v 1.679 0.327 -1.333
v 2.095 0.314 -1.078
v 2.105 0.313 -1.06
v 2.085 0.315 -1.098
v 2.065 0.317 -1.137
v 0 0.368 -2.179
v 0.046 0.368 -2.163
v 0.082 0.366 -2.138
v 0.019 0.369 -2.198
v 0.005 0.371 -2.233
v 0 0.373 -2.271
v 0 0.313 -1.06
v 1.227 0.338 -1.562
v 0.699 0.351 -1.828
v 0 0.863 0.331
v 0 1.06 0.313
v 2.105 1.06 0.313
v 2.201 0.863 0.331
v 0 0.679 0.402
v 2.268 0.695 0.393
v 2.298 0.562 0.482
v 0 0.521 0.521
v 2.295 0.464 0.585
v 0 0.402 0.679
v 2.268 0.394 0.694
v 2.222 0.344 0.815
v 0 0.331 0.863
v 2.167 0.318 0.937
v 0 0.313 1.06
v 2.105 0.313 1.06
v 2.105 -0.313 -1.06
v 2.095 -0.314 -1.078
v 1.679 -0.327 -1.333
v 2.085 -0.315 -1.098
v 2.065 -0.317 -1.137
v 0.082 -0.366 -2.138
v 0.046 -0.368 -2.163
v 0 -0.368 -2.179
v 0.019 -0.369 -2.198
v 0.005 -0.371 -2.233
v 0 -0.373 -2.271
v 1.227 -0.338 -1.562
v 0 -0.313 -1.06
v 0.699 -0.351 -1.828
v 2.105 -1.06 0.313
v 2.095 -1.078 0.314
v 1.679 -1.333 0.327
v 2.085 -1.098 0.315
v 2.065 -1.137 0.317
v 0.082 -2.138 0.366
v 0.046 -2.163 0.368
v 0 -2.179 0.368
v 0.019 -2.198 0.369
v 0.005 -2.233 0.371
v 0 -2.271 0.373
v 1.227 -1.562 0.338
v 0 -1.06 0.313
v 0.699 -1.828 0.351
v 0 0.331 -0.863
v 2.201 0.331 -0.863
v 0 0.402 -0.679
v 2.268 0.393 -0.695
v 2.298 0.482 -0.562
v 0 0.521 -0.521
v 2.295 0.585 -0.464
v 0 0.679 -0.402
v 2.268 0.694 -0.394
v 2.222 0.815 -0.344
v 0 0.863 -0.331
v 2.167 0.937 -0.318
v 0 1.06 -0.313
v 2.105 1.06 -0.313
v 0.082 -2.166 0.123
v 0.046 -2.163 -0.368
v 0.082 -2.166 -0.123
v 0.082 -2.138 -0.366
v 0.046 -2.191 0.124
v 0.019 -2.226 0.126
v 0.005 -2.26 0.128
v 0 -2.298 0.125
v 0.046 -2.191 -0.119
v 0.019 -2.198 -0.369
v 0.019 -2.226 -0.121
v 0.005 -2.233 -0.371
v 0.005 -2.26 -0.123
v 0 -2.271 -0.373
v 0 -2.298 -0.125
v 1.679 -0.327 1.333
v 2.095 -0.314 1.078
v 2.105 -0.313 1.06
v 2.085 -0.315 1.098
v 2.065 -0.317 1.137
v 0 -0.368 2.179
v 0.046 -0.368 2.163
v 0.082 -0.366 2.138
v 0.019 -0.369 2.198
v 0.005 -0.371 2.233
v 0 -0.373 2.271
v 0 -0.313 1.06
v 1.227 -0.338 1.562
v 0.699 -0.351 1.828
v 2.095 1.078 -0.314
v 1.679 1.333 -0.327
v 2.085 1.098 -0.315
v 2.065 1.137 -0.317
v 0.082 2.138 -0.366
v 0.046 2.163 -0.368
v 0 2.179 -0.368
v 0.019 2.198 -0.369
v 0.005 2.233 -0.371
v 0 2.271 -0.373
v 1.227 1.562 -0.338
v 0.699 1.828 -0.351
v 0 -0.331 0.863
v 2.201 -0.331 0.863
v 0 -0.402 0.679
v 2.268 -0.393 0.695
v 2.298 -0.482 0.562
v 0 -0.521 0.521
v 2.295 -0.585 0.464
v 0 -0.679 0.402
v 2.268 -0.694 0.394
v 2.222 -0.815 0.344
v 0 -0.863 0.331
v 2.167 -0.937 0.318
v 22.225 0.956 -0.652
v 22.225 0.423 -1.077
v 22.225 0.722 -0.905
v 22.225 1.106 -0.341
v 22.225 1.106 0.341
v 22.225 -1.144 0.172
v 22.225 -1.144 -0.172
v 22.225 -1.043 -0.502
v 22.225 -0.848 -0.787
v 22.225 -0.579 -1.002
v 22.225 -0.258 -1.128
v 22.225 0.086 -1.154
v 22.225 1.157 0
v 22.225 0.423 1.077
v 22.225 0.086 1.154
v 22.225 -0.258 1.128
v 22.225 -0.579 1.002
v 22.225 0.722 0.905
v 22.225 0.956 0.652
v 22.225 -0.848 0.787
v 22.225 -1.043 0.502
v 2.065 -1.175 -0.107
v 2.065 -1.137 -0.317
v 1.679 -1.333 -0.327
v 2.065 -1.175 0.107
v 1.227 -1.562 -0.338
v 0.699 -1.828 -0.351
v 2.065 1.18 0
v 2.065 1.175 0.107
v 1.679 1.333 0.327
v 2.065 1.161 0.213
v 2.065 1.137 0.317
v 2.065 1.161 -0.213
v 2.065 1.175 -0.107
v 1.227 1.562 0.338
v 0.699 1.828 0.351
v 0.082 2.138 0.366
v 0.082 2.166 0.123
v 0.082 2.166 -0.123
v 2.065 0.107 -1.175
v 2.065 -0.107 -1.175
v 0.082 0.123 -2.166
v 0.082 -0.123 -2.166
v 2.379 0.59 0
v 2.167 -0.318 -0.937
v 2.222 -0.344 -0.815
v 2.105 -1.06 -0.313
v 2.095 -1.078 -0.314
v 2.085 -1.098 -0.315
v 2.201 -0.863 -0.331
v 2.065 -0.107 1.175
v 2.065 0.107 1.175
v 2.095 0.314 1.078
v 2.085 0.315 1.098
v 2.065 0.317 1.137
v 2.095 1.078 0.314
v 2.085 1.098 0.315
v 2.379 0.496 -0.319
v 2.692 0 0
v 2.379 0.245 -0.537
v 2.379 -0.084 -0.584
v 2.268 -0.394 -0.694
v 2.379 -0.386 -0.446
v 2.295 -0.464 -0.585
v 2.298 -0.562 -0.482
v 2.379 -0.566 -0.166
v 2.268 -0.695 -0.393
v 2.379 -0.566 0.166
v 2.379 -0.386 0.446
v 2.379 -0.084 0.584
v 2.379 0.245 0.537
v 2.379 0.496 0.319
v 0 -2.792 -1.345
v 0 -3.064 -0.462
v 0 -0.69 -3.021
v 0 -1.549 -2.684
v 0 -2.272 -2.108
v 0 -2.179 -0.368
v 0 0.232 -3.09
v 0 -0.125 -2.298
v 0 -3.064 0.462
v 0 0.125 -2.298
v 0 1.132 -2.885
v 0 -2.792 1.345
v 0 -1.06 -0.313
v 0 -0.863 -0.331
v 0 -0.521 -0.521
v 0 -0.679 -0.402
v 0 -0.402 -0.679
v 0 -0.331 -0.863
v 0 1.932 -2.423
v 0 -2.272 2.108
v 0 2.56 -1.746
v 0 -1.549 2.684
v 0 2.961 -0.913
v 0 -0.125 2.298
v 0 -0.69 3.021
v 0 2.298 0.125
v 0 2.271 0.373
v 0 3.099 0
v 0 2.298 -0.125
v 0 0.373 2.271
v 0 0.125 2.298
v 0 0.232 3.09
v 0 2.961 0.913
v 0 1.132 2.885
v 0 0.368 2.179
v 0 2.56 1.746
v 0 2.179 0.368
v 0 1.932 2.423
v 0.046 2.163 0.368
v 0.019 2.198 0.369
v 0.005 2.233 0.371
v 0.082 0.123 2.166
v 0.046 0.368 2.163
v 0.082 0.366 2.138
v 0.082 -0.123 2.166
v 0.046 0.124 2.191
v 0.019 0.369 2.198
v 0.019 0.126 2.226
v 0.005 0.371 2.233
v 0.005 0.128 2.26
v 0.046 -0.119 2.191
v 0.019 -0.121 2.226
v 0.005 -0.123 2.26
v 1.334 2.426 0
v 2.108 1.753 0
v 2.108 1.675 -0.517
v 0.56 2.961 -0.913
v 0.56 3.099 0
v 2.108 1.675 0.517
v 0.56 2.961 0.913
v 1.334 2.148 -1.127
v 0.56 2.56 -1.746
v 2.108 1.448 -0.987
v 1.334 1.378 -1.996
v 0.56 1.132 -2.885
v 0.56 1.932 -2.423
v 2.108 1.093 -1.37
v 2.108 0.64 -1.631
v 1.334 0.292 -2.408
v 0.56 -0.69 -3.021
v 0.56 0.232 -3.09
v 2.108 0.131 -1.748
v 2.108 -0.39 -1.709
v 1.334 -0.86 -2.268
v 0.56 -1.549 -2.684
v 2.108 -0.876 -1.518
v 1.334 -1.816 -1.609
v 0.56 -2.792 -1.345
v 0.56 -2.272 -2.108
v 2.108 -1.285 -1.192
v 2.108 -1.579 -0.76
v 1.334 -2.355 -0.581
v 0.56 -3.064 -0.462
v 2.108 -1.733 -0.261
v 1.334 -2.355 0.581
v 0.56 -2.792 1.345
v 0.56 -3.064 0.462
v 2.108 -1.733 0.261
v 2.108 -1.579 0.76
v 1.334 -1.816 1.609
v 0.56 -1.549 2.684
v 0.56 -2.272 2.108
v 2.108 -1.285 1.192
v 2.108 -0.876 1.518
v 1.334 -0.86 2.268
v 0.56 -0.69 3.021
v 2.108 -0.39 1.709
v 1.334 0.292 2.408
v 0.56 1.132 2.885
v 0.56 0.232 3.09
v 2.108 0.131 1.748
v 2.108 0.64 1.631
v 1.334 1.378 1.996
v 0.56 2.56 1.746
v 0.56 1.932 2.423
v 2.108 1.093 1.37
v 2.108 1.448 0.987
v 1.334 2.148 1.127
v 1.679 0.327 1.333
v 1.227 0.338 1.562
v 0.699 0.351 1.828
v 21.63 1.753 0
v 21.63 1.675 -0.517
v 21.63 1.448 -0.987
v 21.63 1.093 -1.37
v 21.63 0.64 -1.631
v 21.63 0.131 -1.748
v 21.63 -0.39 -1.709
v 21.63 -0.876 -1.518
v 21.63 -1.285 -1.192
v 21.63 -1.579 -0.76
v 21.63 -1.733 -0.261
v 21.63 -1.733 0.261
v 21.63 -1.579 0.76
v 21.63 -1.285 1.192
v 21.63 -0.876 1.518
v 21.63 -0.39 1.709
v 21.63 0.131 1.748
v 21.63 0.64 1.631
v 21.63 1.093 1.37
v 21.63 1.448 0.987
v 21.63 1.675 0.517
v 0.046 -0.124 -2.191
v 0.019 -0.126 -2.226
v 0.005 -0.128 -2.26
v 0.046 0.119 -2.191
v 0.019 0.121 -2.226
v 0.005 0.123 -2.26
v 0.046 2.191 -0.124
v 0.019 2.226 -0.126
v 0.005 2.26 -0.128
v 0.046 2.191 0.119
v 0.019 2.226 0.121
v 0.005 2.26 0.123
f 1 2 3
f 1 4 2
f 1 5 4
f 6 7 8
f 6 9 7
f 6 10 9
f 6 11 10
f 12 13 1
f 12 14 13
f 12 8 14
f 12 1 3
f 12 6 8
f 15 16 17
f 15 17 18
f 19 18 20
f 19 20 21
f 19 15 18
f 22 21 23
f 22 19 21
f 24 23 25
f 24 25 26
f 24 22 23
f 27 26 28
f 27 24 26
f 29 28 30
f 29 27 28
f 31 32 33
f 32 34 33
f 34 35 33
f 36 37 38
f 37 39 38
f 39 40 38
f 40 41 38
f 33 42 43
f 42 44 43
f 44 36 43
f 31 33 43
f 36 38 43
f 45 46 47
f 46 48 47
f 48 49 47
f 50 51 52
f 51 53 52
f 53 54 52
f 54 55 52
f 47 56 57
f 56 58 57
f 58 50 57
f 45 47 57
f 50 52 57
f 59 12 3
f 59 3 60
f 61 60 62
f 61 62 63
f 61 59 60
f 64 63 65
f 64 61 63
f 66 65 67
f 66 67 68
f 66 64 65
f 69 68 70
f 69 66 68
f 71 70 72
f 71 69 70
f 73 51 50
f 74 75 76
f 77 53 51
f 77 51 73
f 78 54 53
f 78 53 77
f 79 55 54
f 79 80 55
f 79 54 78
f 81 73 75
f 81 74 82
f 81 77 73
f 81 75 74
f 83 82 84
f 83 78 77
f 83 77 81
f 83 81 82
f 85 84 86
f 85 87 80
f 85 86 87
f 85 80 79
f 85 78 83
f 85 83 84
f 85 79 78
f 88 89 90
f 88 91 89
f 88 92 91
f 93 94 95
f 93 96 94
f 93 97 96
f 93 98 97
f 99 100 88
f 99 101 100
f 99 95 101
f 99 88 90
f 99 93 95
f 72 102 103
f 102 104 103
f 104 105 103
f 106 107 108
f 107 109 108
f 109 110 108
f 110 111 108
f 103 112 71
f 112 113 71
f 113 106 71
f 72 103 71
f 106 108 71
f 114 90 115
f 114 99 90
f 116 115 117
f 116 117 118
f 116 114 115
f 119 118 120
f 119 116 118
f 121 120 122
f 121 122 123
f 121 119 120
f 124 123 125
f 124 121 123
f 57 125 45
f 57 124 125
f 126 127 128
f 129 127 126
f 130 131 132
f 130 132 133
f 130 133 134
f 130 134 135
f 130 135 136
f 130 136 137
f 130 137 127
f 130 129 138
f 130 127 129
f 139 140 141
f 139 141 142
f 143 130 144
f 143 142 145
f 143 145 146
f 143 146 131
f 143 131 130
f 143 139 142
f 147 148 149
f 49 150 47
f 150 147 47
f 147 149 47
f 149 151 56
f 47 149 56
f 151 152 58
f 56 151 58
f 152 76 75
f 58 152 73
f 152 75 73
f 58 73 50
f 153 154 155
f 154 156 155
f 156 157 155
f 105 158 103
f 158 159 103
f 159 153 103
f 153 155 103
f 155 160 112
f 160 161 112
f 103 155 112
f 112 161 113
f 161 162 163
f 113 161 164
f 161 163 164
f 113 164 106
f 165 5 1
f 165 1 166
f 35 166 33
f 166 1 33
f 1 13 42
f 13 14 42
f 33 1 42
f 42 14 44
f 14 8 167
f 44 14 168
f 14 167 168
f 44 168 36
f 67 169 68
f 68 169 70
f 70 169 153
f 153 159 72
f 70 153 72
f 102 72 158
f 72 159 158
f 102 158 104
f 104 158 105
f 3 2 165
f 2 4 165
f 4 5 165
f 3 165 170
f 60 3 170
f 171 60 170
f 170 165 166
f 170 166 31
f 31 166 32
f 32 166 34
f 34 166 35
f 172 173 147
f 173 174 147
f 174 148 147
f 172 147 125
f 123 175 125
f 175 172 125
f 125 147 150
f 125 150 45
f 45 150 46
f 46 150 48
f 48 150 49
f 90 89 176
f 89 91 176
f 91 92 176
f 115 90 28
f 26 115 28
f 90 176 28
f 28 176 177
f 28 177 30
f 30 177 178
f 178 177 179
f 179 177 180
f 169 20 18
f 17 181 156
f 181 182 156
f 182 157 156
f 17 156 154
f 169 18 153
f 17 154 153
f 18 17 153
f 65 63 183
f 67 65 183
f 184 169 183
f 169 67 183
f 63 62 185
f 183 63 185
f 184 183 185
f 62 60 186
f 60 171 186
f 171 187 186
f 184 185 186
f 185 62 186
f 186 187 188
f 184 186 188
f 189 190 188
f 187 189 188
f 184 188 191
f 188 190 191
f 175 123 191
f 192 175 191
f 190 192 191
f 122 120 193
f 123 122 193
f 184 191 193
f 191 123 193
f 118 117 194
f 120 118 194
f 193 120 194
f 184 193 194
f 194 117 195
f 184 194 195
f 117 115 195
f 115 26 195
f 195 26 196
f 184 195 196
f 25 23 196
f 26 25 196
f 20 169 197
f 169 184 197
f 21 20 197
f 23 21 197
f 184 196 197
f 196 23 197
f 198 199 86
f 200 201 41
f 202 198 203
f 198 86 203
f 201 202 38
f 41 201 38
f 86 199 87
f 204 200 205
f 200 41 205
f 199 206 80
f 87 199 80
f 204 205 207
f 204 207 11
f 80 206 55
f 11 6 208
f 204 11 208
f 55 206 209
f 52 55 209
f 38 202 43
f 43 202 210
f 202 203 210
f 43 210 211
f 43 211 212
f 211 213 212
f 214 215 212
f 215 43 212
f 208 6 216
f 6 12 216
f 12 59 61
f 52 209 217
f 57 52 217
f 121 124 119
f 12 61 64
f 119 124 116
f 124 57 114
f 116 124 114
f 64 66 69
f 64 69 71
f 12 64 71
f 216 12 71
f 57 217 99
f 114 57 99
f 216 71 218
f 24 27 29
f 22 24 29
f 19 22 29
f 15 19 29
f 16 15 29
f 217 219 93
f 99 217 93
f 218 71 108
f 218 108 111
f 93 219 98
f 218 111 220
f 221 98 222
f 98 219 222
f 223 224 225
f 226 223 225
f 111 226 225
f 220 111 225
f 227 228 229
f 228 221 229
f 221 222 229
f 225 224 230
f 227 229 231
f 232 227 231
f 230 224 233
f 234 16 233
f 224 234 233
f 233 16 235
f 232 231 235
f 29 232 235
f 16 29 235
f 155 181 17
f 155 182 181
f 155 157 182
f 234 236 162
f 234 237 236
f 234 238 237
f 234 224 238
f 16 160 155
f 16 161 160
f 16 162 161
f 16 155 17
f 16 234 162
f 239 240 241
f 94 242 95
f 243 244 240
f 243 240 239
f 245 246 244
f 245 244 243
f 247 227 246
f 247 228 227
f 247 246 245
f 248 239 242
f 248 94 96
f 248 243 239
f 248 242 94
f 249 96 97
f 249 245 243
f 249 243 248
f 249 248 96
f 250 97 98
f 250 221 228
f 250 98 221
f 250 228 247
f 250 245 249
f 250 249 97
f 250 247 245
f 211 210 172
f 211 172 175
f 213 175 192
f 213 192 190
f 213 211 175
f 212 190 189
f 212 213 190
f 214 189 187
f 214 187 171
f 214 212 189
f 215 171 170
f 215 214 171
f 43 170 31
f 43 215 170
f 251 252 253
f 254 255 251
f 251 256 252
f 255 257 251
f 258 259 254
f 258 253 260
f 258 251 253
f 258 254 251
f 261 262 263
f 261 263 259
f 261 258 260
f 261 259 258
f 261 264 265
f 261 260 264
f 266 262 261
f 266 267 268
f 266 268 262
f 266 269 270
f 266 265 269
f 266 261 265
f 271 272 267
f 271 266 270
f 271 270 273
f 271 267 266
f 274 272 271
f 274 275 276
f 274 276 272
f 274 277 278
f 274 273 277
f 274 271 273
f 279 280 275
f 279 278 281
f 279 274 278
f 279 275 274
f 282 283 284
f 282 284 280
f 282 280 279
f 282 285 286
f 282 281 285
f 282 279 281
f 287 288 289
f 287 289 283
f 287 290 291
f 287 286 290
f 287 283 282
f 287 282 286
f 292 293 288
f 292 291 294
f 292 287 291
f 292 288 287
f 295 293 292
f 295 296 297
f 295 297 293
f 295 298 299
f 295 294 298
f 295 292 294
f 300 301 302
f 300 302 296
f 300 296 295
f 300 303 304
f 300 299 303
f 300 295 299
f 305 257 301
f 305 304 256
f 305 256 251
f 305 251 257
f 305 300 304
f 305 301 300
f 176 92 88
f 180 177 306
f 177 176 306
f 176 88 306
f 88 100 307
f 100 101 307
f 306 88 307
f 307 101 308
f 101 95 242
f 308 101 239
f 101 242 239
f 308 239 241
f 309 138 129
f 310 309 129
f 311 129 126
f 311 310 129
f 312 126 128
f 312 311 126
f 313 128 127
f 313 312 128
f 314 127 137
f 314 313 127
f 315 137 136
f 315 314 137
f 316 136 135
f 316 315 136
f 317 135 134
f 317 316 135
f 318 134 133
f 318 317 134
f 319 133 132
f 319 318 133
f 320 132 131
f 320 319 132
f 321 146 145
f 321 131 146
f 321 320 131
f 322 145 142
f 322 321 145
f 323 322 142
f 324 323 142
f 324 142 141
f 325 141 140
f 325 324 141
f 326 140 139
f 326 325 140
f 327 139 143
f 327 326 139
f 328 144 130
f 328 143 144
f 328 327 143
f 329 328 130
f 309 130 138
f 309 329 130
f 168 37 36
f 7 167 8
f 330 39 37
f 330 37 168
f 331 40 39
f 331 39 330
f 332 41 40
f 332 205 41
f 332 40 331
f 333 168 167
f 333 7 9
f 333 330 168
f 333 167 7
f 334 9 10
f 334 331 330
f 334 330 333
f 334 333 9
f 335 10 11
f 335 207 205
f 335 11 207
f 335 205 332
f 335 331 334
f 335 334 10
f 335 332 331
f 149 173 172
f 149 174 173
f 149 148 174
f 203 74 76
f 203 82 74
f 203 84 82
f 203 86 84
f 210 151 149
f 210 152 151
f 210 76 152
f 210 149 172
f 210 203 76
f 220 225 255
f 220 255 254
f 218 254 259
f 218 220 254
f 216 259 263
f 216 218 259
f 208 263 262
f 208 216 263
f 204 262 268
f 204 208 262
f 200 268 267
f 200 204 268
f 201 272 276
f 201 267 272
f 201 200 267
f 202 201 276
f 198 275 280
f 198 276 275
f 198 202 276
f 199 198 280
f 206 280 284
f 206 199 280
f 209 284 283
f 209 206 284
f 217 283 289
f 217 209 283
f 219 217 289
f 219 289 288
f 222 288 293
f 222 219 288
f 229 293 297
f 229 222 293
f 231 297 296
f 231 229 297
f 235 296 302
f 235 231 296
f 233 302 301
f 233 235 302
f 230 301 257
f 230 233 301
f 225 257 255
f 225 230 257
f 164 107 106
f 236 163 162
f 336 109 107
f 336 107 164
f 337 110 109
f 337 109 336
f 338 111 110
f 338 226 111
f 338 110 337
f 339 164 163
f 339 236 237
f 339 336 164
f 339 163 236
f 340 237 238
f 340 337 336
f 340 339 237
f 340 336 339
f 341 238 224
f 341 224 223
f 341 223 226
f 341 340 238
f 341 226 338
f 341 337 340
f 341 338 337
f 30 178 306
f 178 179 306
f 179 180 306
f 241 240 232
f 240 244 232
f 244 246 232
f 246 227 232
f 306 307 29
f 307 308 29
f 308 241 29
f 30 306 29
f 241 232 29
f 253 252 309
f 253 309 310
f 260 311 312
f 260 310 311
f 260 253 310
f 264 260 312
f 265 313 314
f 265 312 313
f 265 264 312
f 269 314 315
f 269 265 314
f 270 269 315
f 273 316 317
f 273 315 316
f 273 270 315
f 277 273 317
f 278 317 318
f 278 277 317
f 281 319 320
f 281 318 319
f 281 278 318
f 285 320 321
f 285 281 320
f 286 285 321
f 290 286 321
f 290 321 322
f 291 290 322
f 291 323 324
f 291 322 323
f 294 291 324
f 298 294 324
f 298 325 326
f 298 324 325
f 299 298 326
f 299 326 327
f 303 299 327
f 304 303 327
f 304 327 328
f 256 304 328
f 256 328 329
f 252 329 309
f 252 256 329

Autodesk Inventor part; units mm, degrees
ref_plane "YZ Plane" through (0, 0, 0) normal (1, 0, 0) x (0, 1, 0)
ref_plane "XZ Plane" through (0, 0, 0) normal (0, 1, 0) x (-1, 0, 0)
sketch "Sketch1" plane through (0, 0, 0) normal (0, 0, 1) x (1, 0, 0)
  line L0 (2.6924, 0) -> (22.225, 0)
  line L1 (22.225, 0) -> (22.225, 1.7526)
  line L2 (22.225, 1.7526) -> (2.1082, 1.7526)
  line L3 (0.5596, 3.0988) -> (0, 3.0988)
  line L4 (-4.445, 0) -> (26.67, 0) projected
  line L5 (0, -0.6198) -> (0, 3.7186) projected
  line L6 (0, 2.2098) -> (2.0648, 1.1803)
  line L7 (2.0648, 1.1803) -> (2.6924, 0)
  line L8 (2.1082, 1.7526) -> (0.5596, 3.0988)
  line L9 (0, 3.0988) -> (0, 2.2098)
  dimension "d2" = 3.5052
  dimension "d3" = 6.1976
  dimension "d4" = 2.6924
  dimension "d5" = 4.4196
  dimension "d6" = 26.5
  dimension "d7" = 62
  dimension "d13" = 41
  dimension "d14" = 2.1082
  dimension "d15" = 22.225
revolve "Body" add sketch "Sketch1" angle 360 about axis through (2.6924, 0, 0) along (1, 0, 0) contours L7 L6 L5 L3 L8 L2 L1 L0
sketch "Sketch2" plane through (0, 0, 0) normal (-1, 0, 0) x (0, 0, 1)
  line L0 (0, -4.3383) -> (0, 4.3383) projected
  line L1 (-4.3383, 0) -> (4.3383, 0) projected
  line L2 (0, 2.2098) -> (0, 0) construction
  line L3 (0, 0) -> (2.2098, 0) construction
  arc A0 (0.7366, 0) -> (0, 0.7366) centre (0, 0) ccw
  line L4 (0, 0) -> (0.7947, 0.7947) construction
  arc A1 (1.1049, 0) -> (0, 1.1049) centre (0, 0) ccw construction
  line L5 (0.3683, 2.1789) -> (0.3131, 1.0596)
  line L6 (2.1789, 0.3683) -> (1.0596, 0.3131)
  arc A2 (0.3131, 1.0596) -> (1.0596, 0.3131) centre (1.0245, 1.0245) ccw
  arc A3 (2.2098, 0) -> (2.1789, 0.3683) centre (0, 0) ccw
  arc A4 (0.3683, 2.1789) -> (0, 2.2098) centre (0, 0) ccw
  arc A5 (2.1789, 0.3683) -> (0.3683, 2.1789) centre (0, 0) ccw
  line L7 (0.3683, -2.1789) -> (0.3131, -1.0596)
  line L8 (2.1789, -0.3683) -> (1.0596, -0.3131)
  arc A6 (1.0596, -0.3131) -> (0.3131, -1.0596) centre (1.0245, -1.0245) ccw
  arc A7 (2.1789, -0.3683) -> (2.2098, 0) centre (0, 0) ccw
  arc A8 (0, -2.2098) -> (0.3683, -2.1789) centre (0, 0) ccw
  arc A9 (0.3683, -2.1789) -> (2.1789, -0.3683) centre (0, 0) ccw
  line L9 (-0.3683, 2.1789) -> (-0.3131, 1.0596)
  line L10 (-2.1789, 0.3683) -> (-1.0596, 0.3131)
  arc A10 (-1.0596, 0.3131) -> (-0.3131, 1.0596) centre (-1.0245, 1.0245) ccw
  arc A11 (-2.1789, 0.3683) -> (-2.2098, 0) centre (0, 0) ccw
  arc A12 (0, 2.2098) -> (-0.3683, 2.1789) centre (0, 0) ccw
  arc A13 (-0.3683, 2.1789) -> (-2.1789, 0.3683) centre (0, 0) ccw
  arc A14 (-2.1789, -0.3683) -> (-0.3683, -2.1789) centre (0, 0) ccw
  arc A15 (-0.3683, -2.1789) -> (0, -2.2098) centre (0, 0) ccw
  arc A16 (-2.2098, 0) -> (-2.1789, -0.3683) centre (0, 0) ccw
  line L11 (-2.1789, -0.3683) -> (-1.0596, -0.3131)
  arc A17 (-0.3131, -1.0596) -> (-1.0596, -0.3131) centre (-1.0245, -1.0245) ccw
  line L12 (-0.3683, -2.1789) -> (-0.3131, -1.0596)
  dimension "d18" = 45
  dimension "d19" = 1.4732
  dimension "d20" = 2.2098
  dimension "d21" = 4.4196
  dimension "d22" = 0.3683
extrude "Slot" add sketch "Sketch2" against normal up to next contours A2 L5 A5 L6 | L9 A10 L10 A13 | L7 A6 L8 A9 | A14 L11 A17 L12
fillet "Fillet1" radius 0.1473 4 edges at (0, 2.2098, 0) (0, 0, 2.2098) (0, -2.2098, 0) (0, 0, -2.2098)
thread "Thread" size "6-32 UNC" class "2A" standard "ANSI Unified Screw Threads" length 18.1324
chamfer "Chamfer1" distance 0.5953 distance2 0.5953 1 edges at (22.225, -1.7526, 0) measured on face at (22.225, -0.5173, -0.2715)
ref_plane "Work Plane2" through (2.032, 0, 0) normal (0, 1, 0) x (1, 0, 0)
equation "\"d2\" = GD"
equation "\"d3\" = KOD"
equation "\"d4\" = INTI"
equation "\"d5\" = SDM"
equation "\"d13\" = 0.5 * SEWI"
equation "\"d14\" = KOH"
equation "\"d15\" = NLG"
equation "\"d19\" = 0.333333 * SDM"
equation "\"d20\" = 0.5 * SDM"
equation "\"d21\" = SDM"
equation "\"d22\" = 0.5 * SBR"
equation "\"d45\" = INTI"
equation "\"d25\" = 0.2 * SBR"
equation "\"d9\" = GEL"
equation "\"d11\" = -0.5 * SPD + 0.5 * GD"
equation "\"d12\" = GUL"
equation "\"GD\" = NND"
equation "\"NLG\" = 22.225"
equation "\"GEL\" = 18.13243"
equation "\"KOD\" = 6.1976"
equation "\"KOH\" = 2.1082"
equation "\"SDM\" = 4.4196"
equation "\"INTI\" = 2.6924"
equation "\"SBR\" = 0.7366"
equation "\"GUL\" = 0.75 * GAL"
equation "\"SPD\" = 2.31458"
equation "\"SEWI\" = 82deg"
equation "\"d0\" = NLG"
equation "\"d1\" = KOH"
equation "\"d17\" = SDM"
equation "\"TOA\" = 30deg"
equation "\"THREADDIA\" = 3.5052"
equation "\"BDM\" = NND"
equation "\"NND\" = 3.5052"
equation "\"GAL\" = 0.79375"
equation "\"GD1\" = SPD"
properties part number "ANSI B18.6.3 - 6-32 x 7/8, CRFCHMSTII(5)" material "Steel, Mild"
